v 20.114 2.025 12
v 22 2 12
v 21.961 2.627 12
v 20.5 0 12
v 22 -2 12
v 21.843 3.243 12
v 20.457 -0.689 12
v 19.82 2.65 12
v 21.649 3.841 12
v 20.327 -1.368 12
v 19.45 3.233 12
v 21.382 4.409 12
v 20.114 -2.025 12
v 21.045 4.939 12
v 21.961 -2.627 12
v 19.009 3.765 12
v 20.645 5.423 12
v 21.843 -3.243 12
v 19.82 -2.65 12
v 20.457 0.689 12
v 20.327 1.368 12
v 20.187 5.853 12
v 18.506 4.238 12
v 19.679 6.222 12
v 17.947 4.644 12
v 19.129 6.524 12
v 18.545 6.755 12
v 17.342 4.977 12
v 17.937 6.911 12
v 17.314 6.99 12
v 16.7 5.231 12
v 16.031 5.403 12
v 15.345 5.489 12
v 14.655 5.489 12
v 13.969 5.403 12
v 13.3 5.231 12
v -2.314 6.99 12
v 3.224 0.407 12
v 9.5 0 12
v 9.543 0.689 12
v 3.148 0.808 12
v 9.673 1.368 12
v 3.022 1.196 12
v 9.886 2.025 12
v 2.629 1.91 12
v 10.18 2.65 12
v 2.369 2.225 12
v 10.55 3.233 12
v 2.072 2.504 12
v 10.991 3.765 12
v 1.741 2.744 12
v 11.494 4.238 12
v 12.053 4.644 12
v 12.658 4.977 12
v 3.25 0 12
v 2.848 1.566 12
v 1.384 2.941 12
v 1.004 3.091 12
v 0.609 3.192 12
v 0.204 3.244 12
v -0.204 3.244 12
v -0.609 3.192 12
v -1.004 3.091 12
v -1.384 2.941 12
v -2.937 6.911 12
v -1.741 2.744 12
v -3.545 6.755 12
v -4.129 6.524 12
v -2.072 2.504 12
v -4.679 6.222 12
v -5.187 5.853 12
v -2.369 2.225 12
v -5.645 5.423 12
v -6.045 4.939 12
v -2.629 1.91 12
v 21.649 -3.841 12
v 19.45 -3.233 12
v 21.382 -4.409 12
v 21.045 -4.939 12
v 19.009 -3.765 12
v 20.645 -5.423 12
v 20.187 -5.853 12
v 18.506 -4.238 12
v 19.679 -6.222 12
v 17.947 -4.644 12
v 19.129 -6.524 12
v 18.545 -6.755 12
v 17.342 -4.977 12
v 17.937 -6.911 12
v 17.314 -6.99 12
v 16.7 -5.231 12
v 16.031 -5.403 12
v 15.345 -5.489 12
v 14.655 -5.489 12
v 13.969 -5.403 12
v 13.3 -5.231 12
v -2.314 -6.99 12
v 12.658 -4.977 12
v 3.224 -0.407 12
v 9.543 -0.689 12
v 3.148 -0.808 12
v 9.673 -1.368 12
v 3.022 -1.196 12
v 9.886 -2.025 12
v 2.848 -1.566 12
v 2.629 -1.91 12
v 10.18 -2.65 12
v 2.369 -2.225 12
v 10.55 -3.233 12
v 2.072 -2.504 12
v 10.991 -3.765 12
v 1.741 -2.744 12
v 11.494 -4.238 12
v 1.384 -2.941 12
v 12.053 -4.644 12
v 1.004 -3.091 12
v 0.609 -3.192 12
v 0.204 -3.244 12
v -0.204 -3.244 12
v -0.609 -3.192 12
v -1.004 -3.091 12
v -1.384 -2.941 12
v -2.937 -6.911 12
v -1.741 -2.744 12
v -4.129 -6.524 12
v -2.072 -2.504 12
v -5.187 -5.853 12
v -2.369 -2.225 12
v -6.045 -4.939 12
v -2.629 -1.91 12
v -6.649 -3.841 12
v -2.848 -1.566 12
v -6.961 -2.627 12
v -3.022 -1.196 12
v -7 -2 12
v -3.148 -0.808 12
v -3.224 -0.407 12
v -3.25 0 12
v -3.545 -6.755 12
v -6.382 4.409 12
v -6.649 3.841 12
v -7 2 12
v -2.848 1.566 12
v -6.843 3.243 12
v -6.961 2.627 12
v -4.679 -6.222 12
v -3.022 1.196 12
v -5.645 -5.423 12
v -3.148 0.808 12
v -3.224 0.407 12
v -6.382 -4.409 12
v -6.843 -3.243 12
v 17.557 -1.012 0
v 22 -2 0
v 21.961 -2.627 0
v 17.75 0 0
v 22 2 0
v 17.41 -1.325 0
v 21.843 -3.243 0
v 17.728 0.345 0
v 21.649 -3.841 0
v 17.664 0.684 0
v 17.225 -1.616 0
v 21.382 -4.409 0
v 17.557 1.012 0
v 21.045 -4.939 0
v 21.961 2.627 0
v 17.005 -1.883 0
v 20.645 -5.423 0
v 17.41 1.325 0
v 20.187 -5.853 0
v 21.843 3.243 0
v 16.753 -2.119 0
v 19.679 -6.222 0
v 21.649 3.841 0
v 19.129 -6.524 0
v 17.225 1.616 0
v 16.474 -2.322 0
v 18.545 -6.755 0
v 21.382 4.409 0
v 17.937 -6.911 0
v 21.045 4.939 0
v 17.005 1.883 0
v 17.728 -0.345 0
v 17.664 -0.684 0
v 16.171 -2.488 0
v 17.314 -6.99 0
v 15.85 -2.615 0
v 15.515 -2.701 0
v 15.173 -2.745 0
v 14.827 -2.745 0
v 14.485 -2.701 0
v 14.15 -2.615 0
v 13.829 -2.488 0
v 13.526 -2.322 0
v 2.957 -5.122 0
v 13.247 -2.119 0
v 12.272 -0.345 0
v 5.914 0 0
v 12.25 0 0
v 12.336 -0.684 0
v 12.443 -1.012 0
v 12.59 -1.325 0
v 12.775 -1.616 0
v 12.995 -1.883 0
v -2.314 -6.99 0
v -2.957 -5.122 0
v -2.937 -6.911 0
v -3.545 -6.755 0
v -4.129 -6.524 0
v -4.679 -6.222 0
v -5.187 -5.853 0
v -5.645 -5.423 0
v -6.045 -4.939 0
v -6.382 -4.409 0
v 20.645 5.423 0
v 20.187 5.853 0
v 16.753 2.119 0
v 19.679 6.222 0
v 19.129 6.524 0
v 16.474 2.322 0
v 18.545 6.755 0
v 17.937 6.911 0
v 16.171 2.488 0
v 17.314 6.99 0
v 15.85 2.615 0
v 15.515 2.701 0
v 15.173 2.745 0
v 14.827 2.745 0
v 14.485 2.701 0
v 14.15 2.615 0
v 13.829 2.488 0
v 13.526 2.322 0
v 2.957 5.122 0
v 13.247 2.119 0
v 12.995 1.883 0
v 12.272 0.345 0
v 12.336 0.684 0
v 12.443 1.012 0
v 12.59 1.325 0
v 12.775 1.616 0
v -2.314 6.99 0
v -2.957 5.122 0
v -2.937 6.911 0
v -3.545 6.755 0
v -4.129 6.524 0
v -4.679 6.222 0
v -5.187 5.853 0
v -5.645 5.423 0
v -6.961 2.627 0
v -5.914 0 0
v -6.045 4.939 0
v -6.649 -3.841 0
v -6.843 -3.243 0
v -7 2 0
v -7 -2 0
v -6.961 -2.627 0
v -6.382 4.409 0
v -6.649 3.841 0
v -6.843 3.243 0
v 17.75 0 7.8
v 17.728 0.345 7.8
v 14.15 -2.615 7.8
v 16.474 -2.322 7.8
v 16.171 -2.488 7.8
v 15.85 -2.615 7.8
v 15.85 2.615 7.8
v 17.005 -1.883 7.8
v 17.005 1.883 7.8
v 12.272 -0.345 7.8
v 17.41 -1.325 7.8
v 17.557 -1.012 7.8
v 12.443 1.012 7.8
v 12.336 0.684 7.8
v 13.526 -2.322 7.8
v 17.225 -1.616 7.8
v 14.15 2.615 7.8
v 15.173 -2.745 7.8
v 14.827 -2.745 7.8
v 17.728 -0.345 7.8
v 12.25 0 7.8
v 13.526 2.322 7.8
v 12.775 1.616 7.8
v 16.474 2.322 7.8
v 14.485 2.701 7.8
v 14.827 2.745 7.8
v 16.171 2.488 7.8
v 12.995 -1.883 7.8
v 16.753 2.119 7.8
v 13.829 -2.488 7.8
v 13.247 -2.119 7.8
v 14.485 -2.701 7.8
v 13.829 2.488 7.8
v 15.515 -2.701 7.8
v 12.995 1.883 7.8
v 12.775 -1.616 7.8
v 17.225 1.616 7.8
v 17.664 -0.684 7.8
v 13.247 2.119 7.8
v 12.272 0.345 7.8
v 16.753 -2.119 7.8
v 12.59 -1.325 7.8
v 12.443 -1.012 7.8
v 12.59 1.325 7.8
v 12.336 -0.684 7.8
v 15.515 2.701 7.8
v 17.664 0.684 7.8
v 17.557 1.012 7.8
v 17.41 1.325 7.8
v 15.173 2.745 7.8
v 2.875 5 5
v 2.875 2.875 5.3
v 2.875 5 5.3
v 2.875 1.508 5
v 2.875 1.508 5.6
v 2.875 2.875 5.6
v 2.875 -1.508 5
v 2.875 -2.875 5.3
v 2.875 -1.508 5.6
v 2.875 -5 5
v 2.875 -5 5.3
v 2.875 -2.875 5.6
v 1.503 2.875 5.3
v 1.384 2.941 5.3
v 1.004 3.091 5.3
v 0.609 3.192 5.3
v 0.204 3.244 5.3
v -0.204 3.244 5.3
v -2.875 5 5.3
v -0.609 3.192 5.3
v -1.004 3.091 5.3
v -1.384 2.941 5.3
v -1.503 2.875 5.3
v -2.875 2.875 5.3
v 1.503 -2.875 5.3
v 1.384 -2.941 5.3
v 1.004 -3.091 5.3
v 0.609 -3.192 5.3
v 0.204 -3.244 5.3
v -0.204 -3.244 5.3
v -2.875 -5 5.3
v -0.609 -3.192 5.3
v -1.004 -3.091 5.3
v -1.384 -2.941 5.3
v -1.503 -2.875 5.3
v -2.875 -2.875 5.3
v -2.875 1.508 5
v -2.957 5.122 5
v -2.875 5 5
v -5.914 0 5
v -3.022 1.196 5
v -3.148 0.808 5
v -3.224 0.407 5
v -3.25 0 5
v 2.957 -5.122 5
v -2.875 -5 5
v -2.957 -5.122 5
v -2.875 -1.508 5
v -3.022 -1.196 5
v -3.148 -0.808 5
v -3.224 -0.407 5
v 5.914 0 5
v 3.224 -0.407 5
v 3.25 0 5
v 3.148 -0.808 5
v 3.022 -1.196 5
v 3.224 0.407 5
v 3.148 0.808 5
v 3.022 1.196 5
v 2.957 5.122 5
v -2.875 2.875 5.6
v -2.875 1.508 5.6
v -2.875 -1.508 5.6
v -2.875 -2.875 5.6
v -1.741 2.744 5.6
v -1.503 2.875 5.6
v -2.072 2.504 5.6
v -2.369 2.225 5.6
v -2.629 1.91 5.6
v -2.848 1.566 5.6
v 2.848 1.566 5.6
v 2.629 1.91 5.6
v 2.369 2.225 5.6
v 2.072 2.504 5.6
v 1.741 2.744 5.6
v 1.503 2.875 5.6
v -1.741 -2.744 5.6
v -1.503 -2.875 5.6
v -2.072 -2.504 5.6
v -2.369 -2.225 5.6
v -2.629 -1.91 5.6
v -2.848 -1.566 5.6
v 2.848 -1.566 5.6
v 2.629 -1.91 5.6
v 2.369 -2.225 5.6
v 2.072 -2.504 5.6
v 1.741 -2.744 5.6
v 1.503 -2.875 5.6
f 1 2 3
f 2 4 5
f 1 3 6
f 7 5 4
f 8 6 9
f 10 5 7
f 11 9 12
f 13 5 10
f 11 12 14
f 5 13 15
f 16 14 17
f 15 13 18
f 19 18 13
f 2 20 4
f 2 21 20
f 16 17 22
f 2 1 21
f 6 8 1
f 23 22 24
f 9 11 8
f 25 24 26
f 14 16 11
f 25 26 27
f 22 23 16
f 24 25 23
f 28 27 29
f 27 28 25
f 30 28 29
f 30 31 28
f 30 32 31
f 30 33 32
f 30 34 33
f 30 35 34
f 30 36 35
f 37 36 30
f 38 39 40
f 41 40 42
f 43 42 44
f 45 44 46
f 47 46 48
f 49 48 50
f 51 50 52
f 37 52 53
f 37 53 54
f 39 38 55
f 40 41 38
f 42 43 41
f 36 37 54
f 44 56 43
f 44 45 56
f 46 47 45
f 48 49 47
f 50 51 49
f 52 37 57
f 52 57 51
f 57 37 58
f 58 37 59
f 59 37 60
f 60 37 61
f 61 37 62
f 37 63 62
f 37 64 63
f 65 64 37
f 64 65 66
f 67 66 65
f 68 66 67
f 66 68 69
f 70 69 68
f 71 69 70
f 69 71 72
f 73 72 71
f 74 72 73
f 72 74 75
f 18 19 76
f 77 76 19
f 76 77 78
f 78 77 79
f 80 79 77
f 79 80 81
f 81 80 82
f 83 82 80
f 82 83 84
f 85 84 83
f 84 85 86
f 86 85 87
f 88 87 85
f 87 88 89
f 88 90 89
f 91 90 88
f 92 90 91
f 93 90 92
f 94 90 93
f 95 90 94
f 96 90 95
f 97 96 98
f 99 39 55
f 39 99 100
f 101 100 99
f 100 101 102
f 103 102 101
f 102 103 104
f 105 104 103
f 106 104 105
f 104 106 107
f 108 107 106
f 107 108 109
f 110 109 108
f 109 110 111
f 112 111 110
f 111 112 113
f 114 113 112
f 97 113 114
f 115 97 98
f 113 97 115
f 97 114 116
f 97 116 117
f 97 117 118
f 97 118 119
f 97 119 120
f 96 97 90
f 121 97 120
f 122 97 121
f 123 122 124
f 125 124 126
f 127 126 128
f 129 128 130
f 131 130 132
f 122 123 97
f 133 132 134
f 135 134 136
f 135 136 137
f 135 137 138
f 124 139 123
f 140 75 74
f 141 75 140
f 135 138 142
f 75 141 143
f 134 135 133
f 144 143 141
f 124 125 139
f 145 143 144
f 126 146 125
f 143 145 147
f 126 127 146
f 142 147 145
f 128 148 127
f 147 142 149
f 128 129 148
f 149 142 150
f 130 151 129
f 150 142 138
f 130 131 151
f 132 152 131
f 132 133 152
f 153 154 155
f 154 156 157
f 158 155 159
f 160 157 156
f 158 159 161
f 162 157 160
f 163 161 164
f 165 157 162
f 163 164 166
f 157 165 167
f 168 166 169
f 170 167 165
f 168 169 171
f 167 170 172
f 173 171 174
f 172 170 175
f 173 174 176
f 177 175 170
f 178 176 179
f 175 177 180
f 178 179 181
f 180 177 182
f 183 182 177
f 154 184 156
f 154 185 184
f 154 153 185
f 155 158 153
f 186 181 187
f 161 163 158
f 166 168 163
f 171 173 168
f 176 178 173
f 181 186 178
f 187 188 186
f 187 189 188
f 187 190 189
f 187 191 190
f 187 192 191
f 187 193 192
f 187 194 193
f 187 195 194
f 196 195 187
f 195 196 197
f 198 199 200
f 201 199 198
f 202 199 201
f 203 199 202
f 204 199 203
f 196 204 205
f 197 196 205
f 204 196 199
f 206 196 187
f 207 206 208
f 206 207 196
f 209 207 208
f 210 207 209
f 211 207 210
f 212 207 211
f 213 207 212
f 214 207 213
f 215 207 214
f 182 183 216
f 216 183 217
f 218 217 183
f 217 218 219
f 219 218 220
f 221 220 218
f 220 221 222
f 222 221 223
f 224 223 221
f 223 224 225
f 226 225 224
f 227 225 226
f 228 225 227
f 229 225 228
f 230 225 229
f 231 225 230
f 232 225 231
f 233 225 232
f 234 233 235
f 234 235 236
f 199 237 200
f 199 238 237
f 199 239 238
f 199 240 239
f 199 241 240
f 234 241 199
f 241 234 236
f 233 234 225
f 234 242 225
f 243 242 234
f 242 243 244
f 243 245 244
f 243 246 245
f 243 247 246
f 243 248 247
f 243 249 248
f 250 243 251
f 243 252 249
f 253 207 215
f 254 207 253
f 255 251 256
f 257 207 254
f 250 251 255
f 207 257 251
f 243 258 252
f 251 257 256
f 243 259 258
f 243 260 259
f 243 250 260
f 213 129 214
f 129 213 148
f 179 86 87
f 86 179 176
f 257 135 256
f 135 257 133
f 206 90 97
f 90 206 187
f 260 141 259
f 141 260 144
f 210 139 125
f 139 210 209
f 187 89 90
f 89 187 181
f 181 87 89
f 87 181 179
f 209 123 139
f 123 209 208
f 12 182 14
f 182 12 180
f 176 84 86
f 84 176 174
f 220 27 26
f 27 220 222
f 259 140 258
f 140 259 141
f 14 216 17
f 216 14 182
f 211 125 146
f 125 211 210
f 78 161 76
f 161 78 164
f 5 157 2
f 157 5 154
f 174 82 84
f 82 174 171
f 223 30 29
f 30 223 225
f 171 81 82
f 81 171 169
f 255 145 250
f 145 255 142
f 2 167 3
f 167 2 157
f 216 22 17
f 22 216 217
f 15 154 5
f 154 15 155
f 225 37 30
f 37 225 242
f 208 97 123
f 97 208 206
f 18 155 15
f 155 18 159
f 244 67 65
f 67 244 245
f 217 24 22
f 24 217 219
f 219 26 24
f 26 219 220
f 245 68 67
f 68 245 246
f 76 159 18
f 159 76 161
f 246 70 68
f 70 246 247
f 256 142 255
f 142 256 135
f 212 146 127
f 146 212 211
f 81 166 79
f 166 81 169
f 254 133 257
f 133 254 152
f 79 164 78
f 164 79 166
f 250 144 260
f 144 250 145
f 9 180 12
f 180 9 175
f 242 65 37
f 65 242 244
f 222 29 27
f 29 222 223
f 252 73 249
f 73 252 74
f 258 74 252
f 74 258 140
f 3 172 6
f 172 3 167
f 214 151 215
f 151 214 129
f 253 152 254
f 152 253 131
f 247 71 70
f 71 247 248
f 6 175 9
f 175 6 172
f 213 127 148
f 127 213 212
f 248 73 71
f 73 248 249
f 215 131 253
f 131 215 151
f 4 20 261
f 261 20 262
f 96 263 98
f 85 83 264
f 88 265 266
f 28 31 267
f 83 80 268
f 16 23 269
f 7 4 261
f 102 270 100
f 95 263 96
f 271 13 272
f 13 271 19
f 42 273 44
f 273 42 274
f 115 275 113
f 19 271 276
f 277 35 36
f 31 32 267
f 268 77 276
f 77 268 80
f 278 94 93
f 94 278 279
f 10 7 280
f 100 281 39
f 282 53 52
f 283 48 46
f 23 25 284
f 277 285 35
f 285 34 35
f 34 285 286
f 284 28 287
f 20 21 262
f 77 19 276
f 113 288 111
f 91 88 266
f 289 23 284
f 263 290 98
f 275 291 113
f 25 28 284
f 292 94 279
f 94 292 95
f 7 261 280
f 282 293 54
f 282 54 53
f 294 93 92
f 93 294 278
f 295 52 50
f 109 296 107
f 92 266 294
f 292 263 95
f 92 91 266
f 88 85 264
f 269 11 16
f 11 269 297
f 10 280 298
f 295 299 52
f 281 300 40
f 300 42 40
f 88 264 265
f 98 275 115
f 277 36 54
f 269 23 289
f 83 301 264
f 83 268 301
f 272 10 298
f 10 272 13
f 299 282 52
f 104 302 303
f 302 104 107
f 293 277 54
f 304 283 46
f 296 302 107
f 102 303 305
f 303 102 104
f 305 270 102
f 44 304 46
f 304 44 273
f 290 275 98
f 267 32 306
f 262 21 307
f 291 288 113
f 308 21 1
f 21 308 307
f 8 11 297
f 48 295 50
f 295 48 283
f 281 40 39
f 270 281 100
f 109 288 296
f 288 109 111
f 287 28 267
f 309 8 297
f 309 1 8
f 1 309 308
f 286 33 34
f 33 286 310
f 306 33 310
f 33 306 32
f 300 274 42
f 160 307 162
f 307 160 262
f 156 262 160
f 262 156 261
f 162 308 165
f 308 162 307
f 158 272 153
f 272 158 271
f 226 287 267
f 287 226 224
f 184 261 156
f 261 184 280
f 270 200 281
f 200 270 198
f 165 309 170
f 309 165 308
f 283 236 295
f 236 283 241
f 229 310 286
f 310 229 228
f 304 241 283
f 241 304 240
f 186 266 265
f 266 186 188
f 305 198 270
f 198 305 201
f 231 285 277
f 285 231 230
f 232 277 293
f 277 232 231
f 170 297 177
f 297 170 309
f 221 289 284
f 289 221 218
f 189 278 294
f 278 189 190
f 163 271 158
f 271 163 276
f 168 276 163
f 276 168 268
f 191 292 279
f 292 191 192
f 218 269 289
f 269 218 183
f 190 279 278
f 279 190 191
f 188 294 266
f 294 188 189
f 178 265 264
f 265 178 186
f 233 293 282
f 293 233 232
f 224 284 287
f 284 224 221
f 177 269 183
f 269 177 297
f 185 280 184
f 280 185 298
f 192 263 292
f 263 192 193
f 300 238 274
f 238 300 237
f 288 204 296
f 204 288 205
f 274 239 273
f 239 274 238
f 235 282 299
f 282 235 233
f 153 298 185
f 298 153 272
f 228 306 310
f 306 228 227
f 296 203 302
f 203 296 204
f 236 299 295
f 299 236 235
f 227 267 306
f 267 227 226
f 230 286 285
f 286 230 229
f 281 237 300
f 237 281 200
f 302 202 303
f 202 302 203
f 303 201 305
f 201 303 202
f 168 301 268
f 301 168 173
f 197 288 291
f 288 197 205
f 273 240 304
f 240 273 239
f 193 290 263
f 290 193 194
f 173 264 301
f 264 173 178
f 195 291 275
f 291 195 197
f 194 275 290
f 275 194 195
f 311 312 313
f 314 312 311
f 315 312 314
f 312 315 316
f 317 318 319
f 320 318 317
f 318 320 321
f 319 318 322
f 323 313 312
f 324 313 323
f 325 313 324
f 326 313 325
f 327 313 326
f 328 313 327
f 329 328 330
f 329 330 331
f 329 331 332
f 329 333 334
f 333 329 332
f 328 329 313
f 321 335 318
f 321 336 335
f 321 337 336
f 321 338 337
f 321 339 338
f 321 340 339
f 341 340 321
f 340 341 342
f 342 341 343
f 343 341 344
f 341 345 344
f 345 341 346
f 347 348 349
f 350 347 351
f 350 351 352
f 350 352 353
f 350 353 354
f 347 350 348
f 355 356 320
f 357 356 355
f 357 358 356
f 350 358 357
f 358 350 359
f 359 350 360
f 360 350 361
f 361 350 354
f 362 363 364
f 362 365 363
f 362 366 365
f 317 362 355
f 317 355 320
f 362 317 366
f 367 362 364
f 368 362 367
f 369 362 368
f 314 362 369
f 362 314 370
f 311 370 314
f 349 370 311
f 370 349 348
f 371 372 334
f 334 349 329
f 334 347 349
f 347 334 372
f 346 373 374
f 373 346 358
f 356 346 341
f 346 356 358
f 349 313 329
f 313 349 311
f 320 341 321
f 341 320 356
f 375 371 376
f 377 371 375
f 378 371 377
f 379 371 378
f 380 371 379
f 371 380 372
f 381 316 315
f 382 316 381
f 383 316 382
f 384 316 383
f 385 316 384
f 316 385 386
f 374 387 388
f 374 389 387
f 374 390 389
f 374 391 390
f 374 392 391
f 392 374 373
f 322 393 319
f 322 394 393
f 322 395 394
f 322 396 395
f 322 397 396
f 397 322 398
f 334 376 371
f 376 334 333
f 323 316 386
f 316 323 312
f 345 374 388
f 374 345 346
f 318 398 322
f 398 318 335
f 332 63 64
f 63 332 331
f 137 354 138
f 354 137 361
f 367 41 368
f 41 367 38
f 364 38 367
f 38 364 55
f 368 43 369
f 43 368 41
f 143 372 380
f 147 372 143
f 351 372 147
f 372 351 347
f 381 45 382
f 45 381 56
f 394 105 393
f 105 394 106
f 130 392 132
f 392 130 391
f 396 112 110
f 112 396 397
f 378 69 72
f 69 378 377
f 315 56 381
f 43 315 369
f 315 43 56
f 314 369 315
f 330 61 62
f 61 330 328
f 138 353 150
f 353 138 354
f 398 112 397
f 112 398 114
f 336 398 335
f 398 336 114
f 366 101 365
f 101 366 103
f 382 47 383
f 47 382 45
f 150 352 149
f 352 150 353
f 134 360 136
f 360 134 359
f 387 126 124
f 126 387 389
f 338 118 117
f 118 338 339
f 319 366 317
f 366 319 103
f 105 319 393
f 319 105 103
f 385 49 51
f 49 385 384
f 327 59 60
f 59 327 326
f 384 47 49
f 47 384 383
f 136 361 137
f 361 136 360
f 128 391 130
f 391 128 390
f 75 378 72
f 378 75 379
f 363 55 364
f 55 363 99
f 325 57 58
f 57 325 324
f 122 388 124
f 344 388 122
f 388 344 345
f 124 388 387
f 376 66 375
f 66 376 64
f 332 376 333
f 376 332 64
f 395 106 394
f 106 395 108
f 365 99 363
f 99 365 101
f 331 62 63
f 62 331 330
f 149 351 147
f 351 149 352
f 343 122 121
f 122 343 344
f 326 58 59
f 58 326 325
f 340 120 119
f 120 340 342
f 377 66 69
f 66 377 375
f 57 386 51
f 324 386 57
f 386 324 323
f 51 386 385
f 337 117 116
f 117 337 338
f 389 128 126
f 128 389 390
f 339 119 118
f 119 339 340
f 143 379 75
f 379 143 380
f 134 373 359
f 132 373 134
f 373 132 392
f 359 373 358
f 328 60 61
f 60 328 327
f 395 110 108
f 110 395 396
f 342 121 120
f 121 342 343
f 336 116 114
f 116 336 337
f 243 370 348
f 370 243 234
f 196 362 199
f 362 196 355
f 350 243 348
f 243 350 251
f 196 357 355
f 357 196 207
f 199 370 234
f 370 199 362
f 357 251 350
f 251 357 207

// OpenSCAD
$fn = 50;


difference() {
	union() {
		cylinder(h = 12, r = 7.0000000000);
		translate(v = [7.5000000000, 0.0000000000, 0]) {
			hull() {
				translate(v = [-9.5000000000, 2.0000000000, 0]) {
					cylinder(h = 12, r = 5);
				}
				translate(v = [9.5000000000, 2.0000000000, 0]) {
					cylinder(h = 12, r = 5);
				}
				translate(v = [-9.5000000000, -2.0000000000, 0]) {
					cylinder(h = 12, r = 5);
				}
				translate(v = [9.5000000000, -2.0000000000, 0]) {
					cylinder(h = 12, r = 5);
				}
			}
		}
		translate(v = [7.5000000000, 0.0000000000, 0]) {
			hull() {
				translate(v = [-9.5000000000, 2.0000000000, 0]) {
					cylinder(h = 12, r = 5);
				}
				translate(v = [9.5000000000, 2.0000000000, 0]) {
					cylinder(h = 12, r = 5);
				}
				translate(v = [-9.5000000000, -2.0000000000, 0]) {
					cylinder(h = 12, r = 5);
				}
				translate(v = [9.5000000000, -2.0000000000, 0]) {
					cylinder(h = 12, r = 5);
				}
			}
		}
	}
	union() {
		translate(v = [15.0000000000, 0.0000000000, 12]) {
			rotate(a = [0, 0, 0]) {
				difference() {
					union() {
						#translate(v = [0, 0, -12.0000000000]) {
							cylinder(h = 12, r = 2.2500000000);
						}
						#translate(v = [0, 0, -4.2000000000]) {
							cylinder(h = 4.2000000000, r1 = 2.7500000000, r2 = 5.5000000000);
						}
						#translate(v = [0, 0, -12.0000000000]) {
							cylinder(h = 12, r = 2.7500000000);
						}
						#translate(v = [0, 0, -12.0000000000]) {
							cylinder(h = 12, r = 2.2500000000);
						}
					}
					union();
				}
			}
		}
		translate(v = [15.0000000000, 0.0000000000, 12]) {
			rotate(a = [0, 0, 0]) {
				difference() {
					union() {
						#translate(v = [0, 0, -12.0000000000]) {
							cylinder(h = 12, r = 2.2500000000);
						}
						#translate(v = [0, 0, -4.2000000000]) {
							cylinder(h = 4.2000000000, r1 = 2.7500000000, r2 = 5.5000000000);
						}
						#translate(v = [0, 0, -12.0000000000]) {
							cylinder(h = 12, r = 2.7500000000);
						}
						#translate(v = [0, 0, -12.0000000000]) {
							cylinder(h = 12, r = 2.2500000000);
						}
					}
					union();
				}
			}
		}
		translate(v = [0.0000000000, 0.0000000000, 0]) {
			rotate(a = [0, 0, 0]) {
				difference() {
					union() {
						#translate(v = [-2.8750000000, -5.0000000000, -0.3000000000]) {
							cube(size = [5.7500000000, 10, 0.3000000000]);
						}
						#translate(v = [-2.8750000000, -2.8750000000, -0.6000000000]) {
							cube(size = [5.7500000000, 5.7500000000, 0.3000000000]);
						}
						#translate(v = [-2.8750000000, -5.0000000000, 5]) {
							cube(size = [5.7500000000, 10, 0.3000000000]);
						}
						#translate(v = [-2.8750000000, -2.8750000000, 5.3000000000]) {
							cube(size = [5.7500000000, 5.7500000000, 0.3000000000]);
						}
						#translate(v = [0, 0, -100.0000000000]) {
							cylinder(h = 200, r = 3.2500000000);
						}
						#linear_extrude(height = 5) {
							polygon(points = [[5.9142500000, 0.0000000000], [2.9571250000, 5.1218907443], [-2.9571250000, 5.1218907443], [-5.9142500000, 0.0000000000], [-2.9571250000, -5.1218907443], [2.9571250000, -5.1218907443]]);
						}
						#translate(v = [-2.8750000000, -5.0000000000, -0.3000000000]) {
							cube(size = [5.7500000000, 10, 0.3000000000]);
						}
						#translate(v = [-2.8750000000, -2.8750000000, -0.6000000000]) {
							cube(size = [5.7500000000, 5.7500000000, 0.3000000000]);
						}
						#translate(v = [-2.8750000000, -5.0000000000, 5]) {
							cube(size = [5.7500000000, 10, 0.3000000000]);
						}
						#translate(v = [-2.8750000000, -2.8750000000, 5.3000000000]) {
							cube(size = [5.7500000000, 5.7500000000, 0.3000000000]);
						}
						#translate(v = [0, 0, -100.0000000000]) {
							cylinder(h = 200, r = 3.2500000000);
						}
						#translate(v = [-2.8750000000, -5.0000000000, -0.3000000000]) {
							cube(size = [5.7500000000, 10, 0.3000000000]);
						}
						#translate(v = [-2.8750000000, -2.8750000000, -0.6000000000]) {
							cube(size = [5.7500000000, 5.7500000000, 0.3000000000]);
						}
						#translate(v = [-2.8750000000, -5.0000000000, 5]) {
							cube(size = [5.7500000000, 10, 0.3000000000]);
						}
						#translate(v = [-2.8750000000, -2.8750000000, 5.3000000000]) {
							cube(size = [5.7500000000, 5.7500000000, 0.3000000000]);
						}
						#translate(v = [0, 0, -100.0000000000]) {
							cylinder(h = 200, r = 3.2500000000);
						}
					}
					union();
				}
			}
		}
		translate(v = [0, 0, -100]) {
			cylinder(h = 200, r = 3.2500000000);
		}
		translate(v = [0, 0, -100]) {
			cylinder(h = 200, r = 1.8000000000);
		}
	}
}
